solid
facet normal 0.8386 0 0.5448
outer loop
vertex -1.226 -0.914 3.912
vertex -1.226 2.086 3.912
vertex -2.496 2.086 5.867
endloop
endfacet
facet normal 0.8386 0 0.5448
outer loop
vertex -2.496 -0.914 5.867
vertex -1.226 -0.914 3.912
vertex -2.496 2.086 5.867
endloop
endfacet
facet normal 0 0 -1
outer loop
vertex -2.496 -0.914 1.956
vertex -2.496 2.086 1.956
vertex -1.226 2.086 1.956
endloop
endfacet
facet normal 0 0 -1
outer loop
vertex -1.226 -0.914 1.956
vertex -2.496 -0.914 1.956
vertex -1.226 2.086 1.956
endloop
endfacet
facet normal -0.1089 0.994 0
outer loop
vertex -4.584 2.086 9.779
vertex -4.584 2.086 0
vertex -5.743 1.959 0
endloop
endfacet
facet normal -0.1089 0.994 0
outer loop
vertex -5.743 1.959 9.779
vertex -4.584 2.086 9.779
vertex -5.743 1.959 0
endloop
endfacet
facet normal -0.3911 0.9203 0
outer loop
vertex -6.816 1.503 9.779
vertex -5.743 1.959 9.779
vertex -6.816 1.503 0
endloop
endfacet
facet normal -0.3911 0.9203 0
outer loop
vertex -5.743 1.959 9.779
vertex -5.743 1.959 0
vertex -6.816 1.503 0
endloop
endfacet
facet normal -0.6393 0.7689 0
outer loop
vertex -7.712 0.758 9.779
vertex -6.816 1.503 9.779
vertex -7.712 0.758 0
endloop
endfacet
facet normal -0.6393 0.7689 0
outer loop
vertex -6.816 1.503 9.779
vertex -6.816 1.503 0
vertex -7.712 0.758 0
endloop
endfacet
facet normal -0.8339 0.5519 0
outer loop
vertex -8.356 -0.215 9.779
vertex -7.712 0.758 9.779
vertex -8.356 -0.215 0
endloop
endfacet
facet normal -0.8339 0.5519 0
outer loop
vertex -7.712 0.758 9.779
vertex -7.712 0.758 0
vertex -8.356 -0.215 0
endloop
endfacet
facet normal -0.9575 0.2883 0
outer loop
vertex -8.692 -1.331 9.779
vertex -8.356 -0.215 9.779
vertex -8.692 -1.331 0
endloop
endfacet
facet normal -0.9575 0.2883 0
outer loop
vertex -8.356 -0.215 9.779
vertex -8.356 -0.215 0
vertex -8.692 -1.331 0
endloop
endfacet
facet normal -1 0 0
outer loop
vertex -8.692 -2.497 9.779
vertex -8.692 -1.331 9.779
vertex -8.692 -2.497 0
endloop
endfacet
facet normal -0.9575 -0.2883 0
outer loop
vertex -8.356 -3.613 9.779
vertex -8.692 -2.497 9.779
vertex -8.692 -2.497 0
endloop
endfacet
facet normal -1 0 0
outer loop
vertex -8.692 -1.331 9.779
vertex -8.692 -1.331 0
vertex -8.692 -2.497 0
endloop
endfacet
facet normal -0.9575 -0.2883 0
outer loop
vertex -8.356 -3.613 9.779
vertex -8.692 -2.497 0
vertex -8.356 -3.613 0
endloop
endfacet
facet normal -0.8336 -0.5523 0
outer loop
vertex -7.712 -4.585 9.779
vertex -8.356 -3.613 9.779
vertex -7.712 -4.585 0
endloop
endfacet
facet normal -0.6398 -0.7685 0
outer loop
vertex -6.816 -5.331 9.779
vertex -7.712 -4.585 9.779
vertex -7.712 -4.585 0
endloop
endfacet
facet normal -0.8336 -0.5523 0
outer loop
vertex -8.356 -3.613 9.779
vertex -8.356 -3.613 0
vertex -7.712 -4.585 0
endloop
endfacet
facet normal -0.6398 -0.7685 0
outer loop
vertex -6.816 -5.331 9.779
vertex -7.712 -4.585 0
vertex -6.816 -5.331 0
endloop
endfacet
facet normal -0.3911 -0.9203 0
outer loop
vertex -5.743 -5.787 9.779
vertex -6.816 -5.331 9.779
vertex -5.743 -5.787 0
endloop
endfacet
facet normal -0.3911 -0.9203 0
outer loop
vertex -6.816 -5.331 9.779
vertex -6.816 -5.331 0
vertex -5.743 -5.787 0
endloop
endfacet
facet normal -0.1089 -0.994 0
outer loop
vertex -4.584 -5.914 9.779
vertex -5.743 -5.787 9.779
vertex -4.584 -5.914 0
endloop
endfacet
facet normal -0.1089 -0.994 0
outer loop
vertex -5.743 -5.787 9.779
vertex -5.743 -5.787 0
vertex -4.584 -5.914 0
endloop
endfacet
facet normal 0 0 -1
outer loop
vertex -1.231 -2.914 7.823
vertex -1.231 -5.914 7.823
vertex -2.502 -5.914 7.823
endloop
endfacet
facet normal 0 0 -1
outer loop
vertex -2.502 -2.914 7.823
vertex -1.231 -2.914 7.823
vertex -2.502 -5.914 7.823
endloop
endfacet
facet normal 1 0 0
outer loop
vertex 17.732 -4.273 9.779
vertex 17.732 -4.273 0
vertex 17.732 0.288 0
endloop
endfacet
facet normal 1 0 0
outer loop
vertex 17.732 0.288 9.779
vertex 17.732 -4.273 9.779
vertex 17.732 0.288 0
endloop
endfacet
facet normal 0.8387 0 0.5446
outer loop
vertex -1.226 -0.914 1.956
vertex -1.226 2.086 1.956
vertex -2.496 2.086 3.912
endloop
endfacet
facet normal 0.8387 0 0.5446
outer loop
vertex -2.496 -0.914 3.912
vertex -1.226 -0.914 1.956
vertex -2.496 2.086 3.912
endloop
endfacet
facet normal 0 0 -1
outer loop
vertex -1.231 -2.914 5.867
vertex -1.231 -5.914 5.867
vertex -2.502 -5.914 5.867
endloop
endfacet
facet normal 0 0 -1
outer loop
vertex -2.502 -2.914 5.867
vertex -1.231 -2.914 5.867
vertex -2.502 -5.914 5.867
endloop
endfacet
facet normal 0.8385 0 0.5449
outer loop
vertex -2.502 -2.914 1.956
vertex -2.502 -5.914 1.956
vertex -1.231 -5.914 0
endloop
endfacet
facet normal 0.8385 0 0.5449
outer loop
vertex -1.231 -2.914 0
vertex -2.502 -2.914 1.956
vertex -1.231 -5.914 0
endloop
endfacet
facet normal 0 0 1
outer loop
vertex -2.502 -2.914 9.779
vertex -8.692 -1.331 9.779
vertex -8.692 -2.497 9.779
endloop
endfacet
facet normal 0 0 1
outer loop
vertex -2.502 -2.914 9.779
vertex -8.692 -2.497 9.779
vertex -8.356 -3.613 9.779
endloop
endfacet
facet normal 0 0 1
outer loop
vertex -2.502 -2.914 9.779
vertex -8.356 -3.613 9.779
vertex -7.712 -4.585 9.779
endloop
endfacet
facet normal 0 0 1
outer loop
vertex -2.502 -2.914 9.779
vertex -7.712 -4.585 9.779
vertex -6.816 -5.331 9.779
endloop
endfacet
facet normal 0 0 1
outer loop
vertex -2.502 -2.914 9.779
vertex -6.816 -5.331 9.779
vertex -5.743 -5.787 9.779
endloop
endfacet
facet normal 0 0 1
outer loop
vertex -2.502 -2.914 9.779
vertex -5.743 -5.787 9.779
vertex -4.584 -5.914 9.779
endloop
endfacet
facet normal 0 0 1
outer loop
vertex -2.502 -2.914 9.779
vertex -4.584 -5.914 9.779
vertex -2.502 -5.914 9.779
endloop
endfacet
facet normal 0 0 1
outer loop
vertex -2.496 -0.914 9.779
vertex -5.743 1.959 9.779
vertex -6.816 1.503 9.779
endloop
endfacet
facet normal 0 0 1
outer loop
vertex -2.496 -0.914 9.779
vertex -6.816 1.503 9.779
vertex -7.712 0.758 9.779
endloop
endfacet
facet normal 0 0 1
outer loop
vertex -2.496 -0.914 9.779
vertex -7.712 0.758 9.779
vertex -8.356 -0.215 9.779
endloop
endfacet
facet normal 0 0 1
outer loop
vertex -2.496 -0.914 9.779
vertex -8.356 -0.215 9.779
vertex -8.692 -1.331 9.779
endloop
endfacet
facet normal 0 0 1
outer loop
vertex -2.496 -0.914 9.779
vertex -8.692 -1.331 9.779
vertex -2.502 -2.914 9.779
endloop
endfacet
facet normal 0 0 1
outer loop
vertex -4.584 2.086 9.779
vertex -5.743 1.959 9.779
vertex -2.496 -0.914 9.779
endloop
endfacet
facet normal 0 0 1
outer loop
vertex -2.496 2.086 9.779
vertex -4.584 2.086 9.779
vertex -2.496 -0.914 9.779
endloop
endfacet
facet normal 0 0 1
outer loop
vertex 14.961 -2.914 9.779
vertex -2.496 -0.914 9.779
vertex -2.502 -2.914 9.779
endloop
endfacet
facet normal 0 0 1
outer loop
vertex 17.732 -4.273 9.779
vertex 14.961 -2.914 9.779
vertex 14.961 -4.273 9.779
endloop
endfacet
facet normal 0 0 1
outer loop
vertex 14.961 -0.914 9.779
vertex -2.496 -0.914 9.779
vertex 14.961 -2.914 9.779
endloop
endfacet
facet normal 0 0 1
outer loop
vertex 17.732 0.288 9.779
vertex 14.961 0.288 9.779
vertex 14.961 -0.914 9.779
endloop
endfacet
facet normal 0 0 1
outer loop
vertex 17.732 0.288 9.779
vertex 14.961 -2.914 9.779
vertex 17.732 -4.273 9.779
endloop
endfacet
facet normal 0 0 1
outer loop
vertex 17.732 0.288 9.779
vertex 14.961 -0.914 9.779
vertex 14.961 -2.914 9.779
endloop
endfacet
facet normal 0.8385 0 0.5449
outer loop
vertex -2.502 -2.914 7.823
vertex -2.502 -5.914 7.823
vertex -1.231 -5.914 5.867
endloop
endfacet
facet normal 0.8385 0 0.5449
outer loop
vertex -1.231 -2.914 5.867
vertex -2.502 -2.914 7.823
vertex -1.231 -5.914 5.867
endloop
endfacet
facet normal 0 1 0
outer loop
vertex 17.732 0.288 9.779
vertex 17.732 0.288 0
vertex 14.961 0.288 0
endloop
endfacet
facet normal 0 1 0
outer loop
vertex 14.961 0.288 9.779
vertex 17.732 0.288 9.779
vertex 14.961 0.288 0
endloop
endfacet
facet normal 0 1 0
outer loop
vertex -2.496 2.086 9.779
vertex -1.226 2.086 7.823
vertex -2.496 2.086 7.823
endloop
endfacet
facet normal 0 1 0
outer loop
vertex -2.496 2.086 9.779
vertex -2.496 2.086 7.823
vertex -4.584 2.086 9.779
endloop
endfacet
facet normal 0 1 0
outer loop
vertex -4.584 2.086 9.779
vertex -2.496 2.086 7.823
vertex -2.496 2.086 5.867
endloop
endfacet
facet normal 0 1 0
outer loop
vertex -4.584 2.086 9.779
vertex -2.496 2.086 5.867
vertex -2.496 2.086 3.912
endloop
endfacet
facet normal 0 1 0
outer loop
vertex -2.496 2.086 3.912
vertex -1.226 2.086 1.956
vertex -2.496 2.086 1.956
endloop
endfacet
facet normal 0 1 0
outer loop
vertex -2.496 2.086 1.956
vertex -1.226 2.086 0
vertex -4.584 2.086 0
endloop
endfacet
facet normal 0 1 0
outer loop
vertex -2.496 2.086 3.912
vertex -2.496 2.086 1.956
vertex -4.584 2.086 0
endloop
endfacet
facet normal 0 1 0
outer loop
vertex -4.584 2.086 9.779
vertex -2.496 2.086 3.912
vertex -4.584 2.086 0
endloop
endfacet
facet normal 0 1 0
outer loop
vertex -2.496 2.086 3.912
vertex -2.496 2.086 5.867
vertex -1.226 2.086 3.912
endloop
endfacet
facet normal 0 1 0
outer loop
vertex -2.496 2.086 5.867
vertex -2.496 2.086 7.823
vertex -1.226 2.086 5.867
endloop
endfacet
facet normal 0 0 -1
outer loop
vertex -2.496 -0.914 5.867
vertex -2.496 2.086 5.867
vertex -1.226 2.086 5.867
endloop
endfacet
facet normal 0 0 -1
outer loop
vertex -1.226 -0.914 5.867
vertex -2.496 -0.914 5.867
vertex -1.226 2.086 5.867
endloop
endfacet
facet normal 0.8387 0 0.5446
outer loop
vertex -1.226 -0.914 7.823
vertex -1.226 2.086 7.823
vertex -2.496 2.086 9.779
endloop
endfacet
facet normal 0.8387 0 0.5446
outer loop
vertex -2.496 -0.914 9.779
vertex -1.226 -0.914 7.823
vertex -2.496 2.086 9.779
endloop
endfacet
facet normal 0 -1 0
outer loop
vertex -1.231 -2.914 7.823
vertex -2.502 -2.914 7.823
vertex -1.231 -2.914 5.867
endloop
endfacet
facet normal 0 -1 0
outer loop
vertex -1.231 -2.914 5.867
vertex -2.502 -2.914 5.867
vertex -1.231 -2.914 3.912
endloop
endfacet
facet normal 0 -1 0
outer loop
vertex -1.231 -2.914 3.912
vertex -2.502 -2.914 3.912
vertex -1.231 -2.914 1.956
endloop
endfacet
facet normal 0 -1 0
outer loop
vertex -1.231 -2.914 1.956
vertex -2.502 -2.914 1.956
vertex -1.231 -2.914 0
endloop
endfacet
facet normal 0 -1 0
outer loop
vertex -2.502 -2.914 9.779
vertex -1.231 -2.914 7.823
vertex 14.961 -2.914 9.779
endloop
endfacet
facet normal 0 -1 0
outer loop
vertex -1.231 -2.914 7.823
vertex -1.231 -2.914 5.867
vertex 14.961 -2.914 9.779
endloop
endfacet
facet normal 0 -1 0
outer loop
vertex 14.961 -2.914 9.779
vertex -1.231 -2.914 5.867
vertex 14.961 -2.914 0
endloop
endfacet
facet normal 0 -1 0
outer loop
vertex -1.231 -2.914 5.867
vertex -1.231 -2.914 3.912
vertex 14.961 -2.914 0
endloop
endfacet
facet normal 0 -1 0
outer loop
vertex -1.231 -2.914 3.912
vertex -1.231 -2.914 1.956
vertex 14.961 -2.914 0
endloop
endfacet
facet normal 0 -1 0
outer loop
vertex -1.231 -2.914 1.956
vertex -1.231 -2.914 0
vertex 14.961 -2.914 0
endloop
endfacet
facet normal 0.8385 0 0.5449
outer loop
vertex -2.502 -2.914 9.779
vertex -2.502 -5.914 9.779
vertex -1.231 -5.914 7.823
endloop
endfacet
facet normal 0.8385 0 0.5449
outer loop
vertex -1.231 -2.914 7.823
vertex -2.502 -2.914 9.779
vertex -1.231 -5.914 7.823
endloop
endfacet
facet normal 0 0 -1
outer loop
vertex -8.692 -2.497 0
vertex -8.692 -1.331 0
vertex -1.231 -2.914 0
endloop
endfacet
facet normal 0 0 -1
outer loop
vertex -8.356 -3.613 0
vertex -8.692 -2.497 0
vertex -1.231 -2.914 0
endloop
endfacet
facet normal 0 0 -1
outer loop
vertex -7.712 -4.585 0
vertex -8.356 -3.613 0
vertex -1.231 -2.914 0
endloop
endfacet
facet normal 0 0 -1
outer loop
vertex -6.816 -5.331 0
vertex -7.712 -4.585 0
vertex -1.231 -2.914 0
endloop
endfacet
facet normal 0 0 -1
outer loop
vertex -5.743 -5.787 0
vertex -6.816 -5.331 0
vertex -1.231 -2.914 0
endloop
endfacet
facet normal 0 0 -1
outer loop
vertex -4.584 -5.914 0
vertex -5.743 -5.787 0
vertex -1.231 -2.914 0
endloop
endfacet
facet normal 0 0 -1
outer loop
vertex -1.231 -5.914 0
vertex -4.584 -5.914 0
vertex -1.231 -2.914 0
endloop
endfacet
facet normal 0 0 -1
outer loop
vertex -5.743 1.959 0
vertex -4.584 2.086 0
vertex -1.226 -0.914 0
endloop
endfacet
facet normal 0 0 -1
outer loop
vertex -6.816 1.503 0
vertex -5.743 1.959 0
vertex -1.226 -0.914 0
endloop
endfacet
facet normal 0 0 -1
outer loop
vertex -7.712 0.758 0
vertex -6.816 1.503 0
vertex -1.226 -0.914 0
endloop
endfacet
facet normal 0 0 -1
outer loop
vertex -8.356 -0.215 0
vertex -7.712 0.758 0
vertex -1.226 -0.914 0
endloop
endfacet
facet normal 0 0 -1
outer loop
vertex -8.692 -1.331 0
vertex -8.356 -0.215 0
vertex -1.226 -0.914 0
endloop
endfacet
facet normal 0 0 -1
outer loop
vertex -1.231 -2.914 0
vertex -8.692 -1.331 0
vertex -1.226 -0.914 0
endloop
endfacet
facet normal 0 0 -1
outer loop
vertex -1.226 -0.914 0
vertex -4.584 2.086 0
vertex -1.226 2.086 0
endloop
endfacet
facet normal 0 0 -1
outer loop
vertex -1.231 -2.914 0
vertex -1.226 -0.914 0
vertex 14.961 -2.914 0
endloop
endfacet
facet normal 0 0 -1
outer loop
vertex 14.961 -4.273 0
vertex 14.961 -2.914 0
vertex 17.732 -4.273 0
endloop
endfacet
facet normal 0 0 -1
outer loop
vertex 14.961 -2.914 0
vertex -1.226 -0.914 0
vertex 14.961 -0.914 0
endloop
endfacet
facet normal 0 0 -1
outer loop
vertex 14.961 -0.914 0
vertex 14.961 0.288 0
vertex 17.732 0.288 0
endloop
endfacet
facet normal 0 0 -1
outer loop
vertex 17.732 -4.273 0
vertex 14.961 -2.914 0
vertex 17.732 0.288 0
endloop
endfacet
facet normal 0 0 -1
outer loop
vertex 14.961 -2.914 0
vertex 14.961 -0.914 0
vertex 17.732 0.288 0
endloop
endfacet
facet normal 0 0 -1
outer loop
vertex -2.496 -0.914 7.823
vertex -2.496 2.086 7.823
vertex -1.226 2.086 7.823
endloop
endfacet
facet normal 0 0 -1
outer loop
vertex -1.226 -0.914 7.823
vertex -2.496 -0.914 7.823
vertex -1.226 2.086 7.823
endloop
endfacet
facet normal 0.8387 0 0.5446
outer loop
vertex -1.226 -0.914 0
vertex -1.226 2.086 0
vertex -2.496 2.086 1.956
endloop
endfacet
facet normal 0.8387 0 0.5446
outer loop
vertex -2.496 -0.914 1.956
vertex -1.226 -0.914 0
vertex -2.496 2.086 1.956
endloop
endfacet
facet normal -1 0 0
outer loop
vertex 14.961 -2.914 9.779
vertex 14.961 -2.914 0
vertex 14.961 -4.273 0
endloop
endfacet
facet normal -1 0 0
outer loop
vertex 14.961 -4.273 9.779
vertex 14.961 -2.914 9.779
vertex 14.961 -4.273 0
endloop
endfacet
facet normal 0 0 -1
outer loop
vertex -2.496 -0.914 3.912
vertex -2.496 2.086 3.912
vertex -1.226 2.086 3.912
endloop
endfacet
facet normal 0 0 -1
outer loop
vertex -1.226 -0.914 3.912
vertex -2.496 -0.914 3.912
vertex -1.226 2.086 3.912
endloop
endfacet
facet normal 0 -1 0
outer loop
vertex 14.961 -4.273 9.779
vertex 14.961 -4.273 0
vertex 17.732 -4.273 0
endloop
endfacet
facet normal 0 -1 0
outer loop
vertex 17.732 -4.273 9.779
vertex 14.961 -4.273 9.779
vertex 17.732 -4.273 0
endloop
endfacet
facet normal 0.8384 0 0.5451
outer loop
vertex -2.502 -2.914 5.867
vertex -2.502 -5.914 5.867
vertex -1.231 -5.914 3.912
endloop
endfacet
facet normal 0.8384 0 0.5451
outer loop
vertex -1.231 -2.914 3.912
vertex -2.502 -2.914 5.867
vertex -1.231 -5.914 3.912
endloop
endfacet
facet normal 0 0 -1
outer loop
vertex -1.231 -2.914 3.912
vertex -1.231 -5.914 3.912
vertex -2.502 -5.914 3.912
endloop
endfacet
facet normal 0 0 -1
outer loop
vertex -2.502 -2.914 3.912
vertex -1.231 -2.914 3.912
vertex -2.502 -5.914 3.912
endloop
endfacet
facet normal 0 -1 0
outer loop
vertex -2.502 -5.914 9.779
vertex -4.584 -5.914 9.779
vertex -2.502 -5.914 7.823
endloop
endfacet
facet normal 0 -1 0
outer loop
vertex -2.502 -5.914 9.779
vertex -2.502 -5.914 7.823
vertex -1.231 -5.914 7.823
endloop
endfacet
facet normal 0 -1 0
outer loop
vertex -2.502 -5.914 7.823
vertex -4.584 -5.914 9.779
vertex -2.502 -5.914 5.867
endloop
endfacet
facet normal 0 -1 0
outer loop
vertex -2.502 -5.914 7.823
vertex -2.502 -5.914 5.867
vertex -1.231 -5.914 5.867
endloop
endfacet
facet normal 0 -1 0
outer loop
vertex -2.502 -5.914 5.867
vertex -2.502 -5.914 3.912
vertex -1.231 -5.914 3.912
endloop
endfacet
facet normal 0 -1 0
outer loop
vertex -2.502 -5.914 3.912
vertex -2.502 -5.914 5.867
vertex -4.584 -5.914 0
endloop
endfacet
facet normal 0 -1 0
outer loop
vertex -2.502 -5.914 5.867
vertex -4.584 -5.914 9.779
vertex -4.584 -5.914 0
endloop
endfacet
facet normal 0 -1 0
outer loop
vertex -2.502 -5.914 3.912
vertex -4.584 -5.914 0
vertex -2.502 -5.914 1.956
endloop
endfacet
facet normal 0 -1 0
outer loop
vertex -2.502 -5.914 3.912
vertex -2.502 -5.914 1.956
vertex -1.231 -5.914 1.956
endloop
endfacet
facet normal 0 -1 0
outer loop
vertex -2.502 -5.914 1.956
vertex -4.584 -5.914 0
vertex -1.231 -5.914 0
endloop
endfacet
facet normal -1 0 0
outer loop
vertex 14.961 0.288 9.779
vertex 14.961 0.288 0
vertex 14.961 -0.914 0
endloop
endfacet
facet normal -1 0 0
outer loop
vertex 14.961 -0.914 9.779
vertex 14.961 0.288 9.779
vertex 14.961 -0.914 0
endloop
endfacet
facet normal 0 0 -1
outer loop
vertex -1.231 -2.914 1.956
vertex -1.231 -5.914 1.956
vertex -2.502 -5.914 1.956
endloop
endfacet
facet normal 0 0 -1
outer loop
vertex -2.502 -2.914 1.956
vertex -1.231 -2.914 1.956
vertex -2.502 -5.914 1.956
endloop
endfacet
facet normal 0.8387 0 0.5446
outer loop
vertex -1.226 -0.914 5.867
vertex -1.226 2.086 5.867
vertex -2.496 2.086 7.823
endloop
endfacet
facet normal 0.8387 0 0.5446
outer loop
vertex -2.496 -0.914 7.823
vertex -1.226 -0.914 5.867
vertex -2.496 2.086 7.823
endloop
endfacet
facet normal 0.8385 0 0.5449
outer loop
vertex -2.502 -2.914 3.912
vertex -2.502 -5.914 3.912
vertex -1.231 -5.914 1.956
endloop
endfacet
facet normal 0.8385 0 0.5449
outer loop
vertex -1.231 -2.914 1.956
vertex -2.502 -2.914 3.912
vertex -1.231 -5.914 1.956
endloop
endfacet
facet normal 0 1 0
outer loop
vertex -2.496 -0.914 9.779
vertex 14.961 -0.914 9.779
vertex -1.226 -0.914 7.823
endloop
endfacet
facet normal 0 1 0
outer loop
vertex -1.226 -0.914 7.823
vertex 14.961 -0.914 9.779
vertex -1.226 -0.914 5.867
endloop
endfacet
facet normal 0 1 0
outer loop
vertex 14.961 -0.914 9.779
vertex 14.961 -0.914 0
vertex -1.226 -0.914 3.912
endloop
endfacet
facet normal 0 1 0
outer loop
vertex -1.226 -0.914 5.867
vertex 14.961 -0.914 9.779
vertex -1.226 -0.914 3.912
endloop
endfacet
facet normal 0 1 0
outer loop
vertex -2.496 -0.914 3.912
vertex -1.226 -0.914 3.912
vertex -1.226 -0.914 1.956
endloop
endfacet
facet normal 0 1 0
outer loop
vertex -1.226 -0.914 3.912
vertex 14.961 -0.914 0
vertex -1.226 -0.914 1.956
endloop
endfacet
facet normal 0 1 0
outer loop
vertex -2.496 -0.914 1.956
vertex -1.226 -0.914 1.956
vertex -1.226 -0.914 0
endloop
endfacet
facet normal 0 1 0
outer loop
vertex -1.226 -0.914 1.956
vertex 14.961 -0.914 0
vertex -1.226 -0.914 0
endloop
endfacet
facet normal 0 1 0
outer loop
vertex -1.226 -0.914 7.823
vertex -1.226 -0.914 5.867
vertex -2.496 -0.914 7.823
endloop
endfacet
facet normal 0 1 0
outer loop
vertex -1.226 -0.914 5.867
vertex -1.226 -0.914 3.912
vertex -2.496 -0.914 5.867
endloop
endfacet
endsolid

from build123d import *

# Parameters (mm, degrees)
F0_W     = 1.9128494449
F0_H     = 2
F1_DEPTH = 9.779
F3_DEPTH = 3
F5_DEPTH = 3


# Not quite as in the source:
# - a feature names something its author has since deleted; it is built from what else it names


with BuildPart() as f1:
    # F0 (on Top) → F1 (new body)
    with BuildSketch(Plane.XY):
        Polygon((14.9611846233, 0.28775621), (14.9611846233, -0.9137945543), (14.9611846233, -2.9137945543), (14.9611846233, -4.2726983058), (17.7320937316, -4.2726983058), (17.7320937316, 0.28775621), align=None)
        with BuildLine():
            Line((13.0483351785, -0.9137945543), (-0.8558859308, -0.9137945543))
            ThreePointArc((-0.8558859308, -0.9137945543), (-0.7608167592, -1.4097829714), (-0.7289579861, -1.9137945543))
            ThreePointArc((-0.7289579861, -1.9137945543), (-0.7608167592, -2.4178061373), (-0.8558859308, -2.9137945543))
            Line((-0.8558859308, -2.9137945543), (13.0483351785, -2.9137945543))
            Line((13.0483351785, -2.9137945543), (13.0483351785, -0.9137945543))
        make_face()
        with Locations((14.0047599009, -1.9137945543)):
            Rectangle(F0_W, F0_H)
        with BuildLine():
            Line((-4.7316648215, -2.9137945543), (-4.7316648215, -0.9137945543))
            Line((-4.7316648215, -0.9137945543), (-4.7316648215, 2.0862054457))
            Line((-4.7316648215, 2.0862054457), (-4.5844846254, 2.0862054457))
            ThreePointArc((-4.5844846254, 2.0862054457), (-8.7343716569, -1.9137945543), (-4.5844846254, -5.9137945543))
            Line((-4.5844846254, -5.9137945543), (-4.7316648215, -5.9137945543))
            Line((-4.7316648215, -5.9137945543), (-4.7316648215, -2.9137945543))
        make_face()
        with BuildLine():
            Line((-1.2312275376, -2.9137945543), (-4.7316648215, -2.9137945543))
            Line((-4.7316648215, -2.9137945543), (-4.7316648215, -5.9137945543))
            Line((-4.7316648215, -5.9137945543), (-4.5844846254, -5.9137945543))
            ThreePointArc((-4.5844846254, -5.9137945543), (-2.6374223247, -5.3249249204), (-1.2312275376, -3.8550830006))
            Line((-1.2312275376, -3.8550830006), (-1.2312275376, -2.9137945543))
        make_face()
        with BuildLine():
            Line((-4.7316648215, 2.0862054457), (-4.7316648215, -0.9137945543))
            Line((-4.7316648215, -0.9137945543), (-1.2264648215, -0.9137945543))
            Line((-1.2264648215, -0.9137945543), (-1.2264648215, 0.0188810444))
            ThreePointArc((-1.2264648215, 0.0188810444), (-2.6332302099, 1.4947585391), (-4.5844846254, 2.0862054457))
            Line((-4.5844846254, 2.0862054457), (-4.7316648215, 2.0862054457))
        make_face()
        with BuildLine():
            Line((-1.2264648215, -0.9137945543), (-4.7316648215, -0.9137945543))
            Line((-4.7316648215, -0.9137945543), (-4.7316648215, -2.9137945543))
            Line((-4.7316648215, -2.9137945543), (-1.2312275376, -2.9137945543))
            Line((-1.2312275376, -2.9137945543), (-0.8558859308, -2.9137945543))
            ThreePointArc((-0.8558859308, -2.9137945543), (-0.7608167592, -2.4178061373), (-0.7289579861, -1.9137945543))
            ThreePointArc((-0.7289579861, -1.9137945543), (-0.7608167592, -1.4097829714), (-0.8558859308, -0.9137945543))
            Line((-0.8558859308, -0.9137945543), (-1.2264648215, -0.9137945543))
        make_face()
        with BuildLine():
            Line((-1.2312275376, -5.9137945543), (-1.2312275376, -3.8550830006))
            ThreePointArc((-1.2312275376, -3.8550830006), (-2.6374223247, -5.3249249204), (-4.5844846254, -5.9137945543))
            Line((-4.5844846254, -5.9137945543), (-1.2312275376, -5.9137945543))
        make_face()
        with BuildLine():
            ThreePointArc((-4.5844846254, 2.0862054457), (-2.6332302099, 1.4947585391), (-1.2264648215, 0.0188810444))
            Line((-1.2264648215, 0.0188810444), (-1.2264648215, 2.0862054457))
            Line((-1.2264648215, 2.0862054457), (-4.5844846254, 2.0862054457))
        make_face()
    extrude(amount=F1_DEPTH)

    # F2 (on face) → F3 (cut)
    with BuildSketch(Plane.XZ.offset(5.9137945543)):
        Polygon((-1.2312275376, 0), (-1.2312275376, 1.9558), (-2.5021124942, 1.9558), align=None)
        Polygon((-1.2312275376, 1.9558), (-1.2312275376, 3.9116), (-2.5021124942, 3.9116), align=None)
        Polygon((-1.2312275376, 4.8895), (-1.2312275376, 5.8674), (-2.5021124942, 5.8674), (-1.2312275376, 3.9116), align=None)
        Polygon((-1.2312275376, 5.8674), (-1.2312275376, 7.8232), (-2.5021124942, 7.8232), align=None)
        Polygon((-1.2312275376, 9.779), (-2.5021124942, 9.779), (-1.2312275376, 7.8232), align=None)
    extrude(amount=-F3_DEPTH, mode=Mode.SUBTRACT)

    # F4 (on face) → F5 (cut)
    with BuildSketch(Plane(origin=(0, 2.0862054457, 0), x_dir=(-1, 0, 0), z_dir=(0, 1, 0))):
        Polygon((1.2264648215, 9.779), (1.2264648215, 7.8232), (2.4964648215, 9.779), align=None)
        Polygon((1.2264648215, 7.8232), (1.2264648215, 5.8674), (2.4964648215, 7.8232), align=None)
        Polygon((1.2264648215, 4.8895), (1.2264648215, 3.9116), (2.4964648215, 5.8674), (1.2264648215, 5.8674), align=None)
        Polygon((1.2264648215, 3.9116), (1.2264648215, 1.9558), (2.4964648215, 3.9116), align=None)
        Polygon((1.2264648215, 1.9558), (1.2264648215, 0), (2.4964648215, 1.9558), align=None)
    extrude(amount=-F5_DEPTH, mode=Mode.SUBTRACT)


solid = f1.part
